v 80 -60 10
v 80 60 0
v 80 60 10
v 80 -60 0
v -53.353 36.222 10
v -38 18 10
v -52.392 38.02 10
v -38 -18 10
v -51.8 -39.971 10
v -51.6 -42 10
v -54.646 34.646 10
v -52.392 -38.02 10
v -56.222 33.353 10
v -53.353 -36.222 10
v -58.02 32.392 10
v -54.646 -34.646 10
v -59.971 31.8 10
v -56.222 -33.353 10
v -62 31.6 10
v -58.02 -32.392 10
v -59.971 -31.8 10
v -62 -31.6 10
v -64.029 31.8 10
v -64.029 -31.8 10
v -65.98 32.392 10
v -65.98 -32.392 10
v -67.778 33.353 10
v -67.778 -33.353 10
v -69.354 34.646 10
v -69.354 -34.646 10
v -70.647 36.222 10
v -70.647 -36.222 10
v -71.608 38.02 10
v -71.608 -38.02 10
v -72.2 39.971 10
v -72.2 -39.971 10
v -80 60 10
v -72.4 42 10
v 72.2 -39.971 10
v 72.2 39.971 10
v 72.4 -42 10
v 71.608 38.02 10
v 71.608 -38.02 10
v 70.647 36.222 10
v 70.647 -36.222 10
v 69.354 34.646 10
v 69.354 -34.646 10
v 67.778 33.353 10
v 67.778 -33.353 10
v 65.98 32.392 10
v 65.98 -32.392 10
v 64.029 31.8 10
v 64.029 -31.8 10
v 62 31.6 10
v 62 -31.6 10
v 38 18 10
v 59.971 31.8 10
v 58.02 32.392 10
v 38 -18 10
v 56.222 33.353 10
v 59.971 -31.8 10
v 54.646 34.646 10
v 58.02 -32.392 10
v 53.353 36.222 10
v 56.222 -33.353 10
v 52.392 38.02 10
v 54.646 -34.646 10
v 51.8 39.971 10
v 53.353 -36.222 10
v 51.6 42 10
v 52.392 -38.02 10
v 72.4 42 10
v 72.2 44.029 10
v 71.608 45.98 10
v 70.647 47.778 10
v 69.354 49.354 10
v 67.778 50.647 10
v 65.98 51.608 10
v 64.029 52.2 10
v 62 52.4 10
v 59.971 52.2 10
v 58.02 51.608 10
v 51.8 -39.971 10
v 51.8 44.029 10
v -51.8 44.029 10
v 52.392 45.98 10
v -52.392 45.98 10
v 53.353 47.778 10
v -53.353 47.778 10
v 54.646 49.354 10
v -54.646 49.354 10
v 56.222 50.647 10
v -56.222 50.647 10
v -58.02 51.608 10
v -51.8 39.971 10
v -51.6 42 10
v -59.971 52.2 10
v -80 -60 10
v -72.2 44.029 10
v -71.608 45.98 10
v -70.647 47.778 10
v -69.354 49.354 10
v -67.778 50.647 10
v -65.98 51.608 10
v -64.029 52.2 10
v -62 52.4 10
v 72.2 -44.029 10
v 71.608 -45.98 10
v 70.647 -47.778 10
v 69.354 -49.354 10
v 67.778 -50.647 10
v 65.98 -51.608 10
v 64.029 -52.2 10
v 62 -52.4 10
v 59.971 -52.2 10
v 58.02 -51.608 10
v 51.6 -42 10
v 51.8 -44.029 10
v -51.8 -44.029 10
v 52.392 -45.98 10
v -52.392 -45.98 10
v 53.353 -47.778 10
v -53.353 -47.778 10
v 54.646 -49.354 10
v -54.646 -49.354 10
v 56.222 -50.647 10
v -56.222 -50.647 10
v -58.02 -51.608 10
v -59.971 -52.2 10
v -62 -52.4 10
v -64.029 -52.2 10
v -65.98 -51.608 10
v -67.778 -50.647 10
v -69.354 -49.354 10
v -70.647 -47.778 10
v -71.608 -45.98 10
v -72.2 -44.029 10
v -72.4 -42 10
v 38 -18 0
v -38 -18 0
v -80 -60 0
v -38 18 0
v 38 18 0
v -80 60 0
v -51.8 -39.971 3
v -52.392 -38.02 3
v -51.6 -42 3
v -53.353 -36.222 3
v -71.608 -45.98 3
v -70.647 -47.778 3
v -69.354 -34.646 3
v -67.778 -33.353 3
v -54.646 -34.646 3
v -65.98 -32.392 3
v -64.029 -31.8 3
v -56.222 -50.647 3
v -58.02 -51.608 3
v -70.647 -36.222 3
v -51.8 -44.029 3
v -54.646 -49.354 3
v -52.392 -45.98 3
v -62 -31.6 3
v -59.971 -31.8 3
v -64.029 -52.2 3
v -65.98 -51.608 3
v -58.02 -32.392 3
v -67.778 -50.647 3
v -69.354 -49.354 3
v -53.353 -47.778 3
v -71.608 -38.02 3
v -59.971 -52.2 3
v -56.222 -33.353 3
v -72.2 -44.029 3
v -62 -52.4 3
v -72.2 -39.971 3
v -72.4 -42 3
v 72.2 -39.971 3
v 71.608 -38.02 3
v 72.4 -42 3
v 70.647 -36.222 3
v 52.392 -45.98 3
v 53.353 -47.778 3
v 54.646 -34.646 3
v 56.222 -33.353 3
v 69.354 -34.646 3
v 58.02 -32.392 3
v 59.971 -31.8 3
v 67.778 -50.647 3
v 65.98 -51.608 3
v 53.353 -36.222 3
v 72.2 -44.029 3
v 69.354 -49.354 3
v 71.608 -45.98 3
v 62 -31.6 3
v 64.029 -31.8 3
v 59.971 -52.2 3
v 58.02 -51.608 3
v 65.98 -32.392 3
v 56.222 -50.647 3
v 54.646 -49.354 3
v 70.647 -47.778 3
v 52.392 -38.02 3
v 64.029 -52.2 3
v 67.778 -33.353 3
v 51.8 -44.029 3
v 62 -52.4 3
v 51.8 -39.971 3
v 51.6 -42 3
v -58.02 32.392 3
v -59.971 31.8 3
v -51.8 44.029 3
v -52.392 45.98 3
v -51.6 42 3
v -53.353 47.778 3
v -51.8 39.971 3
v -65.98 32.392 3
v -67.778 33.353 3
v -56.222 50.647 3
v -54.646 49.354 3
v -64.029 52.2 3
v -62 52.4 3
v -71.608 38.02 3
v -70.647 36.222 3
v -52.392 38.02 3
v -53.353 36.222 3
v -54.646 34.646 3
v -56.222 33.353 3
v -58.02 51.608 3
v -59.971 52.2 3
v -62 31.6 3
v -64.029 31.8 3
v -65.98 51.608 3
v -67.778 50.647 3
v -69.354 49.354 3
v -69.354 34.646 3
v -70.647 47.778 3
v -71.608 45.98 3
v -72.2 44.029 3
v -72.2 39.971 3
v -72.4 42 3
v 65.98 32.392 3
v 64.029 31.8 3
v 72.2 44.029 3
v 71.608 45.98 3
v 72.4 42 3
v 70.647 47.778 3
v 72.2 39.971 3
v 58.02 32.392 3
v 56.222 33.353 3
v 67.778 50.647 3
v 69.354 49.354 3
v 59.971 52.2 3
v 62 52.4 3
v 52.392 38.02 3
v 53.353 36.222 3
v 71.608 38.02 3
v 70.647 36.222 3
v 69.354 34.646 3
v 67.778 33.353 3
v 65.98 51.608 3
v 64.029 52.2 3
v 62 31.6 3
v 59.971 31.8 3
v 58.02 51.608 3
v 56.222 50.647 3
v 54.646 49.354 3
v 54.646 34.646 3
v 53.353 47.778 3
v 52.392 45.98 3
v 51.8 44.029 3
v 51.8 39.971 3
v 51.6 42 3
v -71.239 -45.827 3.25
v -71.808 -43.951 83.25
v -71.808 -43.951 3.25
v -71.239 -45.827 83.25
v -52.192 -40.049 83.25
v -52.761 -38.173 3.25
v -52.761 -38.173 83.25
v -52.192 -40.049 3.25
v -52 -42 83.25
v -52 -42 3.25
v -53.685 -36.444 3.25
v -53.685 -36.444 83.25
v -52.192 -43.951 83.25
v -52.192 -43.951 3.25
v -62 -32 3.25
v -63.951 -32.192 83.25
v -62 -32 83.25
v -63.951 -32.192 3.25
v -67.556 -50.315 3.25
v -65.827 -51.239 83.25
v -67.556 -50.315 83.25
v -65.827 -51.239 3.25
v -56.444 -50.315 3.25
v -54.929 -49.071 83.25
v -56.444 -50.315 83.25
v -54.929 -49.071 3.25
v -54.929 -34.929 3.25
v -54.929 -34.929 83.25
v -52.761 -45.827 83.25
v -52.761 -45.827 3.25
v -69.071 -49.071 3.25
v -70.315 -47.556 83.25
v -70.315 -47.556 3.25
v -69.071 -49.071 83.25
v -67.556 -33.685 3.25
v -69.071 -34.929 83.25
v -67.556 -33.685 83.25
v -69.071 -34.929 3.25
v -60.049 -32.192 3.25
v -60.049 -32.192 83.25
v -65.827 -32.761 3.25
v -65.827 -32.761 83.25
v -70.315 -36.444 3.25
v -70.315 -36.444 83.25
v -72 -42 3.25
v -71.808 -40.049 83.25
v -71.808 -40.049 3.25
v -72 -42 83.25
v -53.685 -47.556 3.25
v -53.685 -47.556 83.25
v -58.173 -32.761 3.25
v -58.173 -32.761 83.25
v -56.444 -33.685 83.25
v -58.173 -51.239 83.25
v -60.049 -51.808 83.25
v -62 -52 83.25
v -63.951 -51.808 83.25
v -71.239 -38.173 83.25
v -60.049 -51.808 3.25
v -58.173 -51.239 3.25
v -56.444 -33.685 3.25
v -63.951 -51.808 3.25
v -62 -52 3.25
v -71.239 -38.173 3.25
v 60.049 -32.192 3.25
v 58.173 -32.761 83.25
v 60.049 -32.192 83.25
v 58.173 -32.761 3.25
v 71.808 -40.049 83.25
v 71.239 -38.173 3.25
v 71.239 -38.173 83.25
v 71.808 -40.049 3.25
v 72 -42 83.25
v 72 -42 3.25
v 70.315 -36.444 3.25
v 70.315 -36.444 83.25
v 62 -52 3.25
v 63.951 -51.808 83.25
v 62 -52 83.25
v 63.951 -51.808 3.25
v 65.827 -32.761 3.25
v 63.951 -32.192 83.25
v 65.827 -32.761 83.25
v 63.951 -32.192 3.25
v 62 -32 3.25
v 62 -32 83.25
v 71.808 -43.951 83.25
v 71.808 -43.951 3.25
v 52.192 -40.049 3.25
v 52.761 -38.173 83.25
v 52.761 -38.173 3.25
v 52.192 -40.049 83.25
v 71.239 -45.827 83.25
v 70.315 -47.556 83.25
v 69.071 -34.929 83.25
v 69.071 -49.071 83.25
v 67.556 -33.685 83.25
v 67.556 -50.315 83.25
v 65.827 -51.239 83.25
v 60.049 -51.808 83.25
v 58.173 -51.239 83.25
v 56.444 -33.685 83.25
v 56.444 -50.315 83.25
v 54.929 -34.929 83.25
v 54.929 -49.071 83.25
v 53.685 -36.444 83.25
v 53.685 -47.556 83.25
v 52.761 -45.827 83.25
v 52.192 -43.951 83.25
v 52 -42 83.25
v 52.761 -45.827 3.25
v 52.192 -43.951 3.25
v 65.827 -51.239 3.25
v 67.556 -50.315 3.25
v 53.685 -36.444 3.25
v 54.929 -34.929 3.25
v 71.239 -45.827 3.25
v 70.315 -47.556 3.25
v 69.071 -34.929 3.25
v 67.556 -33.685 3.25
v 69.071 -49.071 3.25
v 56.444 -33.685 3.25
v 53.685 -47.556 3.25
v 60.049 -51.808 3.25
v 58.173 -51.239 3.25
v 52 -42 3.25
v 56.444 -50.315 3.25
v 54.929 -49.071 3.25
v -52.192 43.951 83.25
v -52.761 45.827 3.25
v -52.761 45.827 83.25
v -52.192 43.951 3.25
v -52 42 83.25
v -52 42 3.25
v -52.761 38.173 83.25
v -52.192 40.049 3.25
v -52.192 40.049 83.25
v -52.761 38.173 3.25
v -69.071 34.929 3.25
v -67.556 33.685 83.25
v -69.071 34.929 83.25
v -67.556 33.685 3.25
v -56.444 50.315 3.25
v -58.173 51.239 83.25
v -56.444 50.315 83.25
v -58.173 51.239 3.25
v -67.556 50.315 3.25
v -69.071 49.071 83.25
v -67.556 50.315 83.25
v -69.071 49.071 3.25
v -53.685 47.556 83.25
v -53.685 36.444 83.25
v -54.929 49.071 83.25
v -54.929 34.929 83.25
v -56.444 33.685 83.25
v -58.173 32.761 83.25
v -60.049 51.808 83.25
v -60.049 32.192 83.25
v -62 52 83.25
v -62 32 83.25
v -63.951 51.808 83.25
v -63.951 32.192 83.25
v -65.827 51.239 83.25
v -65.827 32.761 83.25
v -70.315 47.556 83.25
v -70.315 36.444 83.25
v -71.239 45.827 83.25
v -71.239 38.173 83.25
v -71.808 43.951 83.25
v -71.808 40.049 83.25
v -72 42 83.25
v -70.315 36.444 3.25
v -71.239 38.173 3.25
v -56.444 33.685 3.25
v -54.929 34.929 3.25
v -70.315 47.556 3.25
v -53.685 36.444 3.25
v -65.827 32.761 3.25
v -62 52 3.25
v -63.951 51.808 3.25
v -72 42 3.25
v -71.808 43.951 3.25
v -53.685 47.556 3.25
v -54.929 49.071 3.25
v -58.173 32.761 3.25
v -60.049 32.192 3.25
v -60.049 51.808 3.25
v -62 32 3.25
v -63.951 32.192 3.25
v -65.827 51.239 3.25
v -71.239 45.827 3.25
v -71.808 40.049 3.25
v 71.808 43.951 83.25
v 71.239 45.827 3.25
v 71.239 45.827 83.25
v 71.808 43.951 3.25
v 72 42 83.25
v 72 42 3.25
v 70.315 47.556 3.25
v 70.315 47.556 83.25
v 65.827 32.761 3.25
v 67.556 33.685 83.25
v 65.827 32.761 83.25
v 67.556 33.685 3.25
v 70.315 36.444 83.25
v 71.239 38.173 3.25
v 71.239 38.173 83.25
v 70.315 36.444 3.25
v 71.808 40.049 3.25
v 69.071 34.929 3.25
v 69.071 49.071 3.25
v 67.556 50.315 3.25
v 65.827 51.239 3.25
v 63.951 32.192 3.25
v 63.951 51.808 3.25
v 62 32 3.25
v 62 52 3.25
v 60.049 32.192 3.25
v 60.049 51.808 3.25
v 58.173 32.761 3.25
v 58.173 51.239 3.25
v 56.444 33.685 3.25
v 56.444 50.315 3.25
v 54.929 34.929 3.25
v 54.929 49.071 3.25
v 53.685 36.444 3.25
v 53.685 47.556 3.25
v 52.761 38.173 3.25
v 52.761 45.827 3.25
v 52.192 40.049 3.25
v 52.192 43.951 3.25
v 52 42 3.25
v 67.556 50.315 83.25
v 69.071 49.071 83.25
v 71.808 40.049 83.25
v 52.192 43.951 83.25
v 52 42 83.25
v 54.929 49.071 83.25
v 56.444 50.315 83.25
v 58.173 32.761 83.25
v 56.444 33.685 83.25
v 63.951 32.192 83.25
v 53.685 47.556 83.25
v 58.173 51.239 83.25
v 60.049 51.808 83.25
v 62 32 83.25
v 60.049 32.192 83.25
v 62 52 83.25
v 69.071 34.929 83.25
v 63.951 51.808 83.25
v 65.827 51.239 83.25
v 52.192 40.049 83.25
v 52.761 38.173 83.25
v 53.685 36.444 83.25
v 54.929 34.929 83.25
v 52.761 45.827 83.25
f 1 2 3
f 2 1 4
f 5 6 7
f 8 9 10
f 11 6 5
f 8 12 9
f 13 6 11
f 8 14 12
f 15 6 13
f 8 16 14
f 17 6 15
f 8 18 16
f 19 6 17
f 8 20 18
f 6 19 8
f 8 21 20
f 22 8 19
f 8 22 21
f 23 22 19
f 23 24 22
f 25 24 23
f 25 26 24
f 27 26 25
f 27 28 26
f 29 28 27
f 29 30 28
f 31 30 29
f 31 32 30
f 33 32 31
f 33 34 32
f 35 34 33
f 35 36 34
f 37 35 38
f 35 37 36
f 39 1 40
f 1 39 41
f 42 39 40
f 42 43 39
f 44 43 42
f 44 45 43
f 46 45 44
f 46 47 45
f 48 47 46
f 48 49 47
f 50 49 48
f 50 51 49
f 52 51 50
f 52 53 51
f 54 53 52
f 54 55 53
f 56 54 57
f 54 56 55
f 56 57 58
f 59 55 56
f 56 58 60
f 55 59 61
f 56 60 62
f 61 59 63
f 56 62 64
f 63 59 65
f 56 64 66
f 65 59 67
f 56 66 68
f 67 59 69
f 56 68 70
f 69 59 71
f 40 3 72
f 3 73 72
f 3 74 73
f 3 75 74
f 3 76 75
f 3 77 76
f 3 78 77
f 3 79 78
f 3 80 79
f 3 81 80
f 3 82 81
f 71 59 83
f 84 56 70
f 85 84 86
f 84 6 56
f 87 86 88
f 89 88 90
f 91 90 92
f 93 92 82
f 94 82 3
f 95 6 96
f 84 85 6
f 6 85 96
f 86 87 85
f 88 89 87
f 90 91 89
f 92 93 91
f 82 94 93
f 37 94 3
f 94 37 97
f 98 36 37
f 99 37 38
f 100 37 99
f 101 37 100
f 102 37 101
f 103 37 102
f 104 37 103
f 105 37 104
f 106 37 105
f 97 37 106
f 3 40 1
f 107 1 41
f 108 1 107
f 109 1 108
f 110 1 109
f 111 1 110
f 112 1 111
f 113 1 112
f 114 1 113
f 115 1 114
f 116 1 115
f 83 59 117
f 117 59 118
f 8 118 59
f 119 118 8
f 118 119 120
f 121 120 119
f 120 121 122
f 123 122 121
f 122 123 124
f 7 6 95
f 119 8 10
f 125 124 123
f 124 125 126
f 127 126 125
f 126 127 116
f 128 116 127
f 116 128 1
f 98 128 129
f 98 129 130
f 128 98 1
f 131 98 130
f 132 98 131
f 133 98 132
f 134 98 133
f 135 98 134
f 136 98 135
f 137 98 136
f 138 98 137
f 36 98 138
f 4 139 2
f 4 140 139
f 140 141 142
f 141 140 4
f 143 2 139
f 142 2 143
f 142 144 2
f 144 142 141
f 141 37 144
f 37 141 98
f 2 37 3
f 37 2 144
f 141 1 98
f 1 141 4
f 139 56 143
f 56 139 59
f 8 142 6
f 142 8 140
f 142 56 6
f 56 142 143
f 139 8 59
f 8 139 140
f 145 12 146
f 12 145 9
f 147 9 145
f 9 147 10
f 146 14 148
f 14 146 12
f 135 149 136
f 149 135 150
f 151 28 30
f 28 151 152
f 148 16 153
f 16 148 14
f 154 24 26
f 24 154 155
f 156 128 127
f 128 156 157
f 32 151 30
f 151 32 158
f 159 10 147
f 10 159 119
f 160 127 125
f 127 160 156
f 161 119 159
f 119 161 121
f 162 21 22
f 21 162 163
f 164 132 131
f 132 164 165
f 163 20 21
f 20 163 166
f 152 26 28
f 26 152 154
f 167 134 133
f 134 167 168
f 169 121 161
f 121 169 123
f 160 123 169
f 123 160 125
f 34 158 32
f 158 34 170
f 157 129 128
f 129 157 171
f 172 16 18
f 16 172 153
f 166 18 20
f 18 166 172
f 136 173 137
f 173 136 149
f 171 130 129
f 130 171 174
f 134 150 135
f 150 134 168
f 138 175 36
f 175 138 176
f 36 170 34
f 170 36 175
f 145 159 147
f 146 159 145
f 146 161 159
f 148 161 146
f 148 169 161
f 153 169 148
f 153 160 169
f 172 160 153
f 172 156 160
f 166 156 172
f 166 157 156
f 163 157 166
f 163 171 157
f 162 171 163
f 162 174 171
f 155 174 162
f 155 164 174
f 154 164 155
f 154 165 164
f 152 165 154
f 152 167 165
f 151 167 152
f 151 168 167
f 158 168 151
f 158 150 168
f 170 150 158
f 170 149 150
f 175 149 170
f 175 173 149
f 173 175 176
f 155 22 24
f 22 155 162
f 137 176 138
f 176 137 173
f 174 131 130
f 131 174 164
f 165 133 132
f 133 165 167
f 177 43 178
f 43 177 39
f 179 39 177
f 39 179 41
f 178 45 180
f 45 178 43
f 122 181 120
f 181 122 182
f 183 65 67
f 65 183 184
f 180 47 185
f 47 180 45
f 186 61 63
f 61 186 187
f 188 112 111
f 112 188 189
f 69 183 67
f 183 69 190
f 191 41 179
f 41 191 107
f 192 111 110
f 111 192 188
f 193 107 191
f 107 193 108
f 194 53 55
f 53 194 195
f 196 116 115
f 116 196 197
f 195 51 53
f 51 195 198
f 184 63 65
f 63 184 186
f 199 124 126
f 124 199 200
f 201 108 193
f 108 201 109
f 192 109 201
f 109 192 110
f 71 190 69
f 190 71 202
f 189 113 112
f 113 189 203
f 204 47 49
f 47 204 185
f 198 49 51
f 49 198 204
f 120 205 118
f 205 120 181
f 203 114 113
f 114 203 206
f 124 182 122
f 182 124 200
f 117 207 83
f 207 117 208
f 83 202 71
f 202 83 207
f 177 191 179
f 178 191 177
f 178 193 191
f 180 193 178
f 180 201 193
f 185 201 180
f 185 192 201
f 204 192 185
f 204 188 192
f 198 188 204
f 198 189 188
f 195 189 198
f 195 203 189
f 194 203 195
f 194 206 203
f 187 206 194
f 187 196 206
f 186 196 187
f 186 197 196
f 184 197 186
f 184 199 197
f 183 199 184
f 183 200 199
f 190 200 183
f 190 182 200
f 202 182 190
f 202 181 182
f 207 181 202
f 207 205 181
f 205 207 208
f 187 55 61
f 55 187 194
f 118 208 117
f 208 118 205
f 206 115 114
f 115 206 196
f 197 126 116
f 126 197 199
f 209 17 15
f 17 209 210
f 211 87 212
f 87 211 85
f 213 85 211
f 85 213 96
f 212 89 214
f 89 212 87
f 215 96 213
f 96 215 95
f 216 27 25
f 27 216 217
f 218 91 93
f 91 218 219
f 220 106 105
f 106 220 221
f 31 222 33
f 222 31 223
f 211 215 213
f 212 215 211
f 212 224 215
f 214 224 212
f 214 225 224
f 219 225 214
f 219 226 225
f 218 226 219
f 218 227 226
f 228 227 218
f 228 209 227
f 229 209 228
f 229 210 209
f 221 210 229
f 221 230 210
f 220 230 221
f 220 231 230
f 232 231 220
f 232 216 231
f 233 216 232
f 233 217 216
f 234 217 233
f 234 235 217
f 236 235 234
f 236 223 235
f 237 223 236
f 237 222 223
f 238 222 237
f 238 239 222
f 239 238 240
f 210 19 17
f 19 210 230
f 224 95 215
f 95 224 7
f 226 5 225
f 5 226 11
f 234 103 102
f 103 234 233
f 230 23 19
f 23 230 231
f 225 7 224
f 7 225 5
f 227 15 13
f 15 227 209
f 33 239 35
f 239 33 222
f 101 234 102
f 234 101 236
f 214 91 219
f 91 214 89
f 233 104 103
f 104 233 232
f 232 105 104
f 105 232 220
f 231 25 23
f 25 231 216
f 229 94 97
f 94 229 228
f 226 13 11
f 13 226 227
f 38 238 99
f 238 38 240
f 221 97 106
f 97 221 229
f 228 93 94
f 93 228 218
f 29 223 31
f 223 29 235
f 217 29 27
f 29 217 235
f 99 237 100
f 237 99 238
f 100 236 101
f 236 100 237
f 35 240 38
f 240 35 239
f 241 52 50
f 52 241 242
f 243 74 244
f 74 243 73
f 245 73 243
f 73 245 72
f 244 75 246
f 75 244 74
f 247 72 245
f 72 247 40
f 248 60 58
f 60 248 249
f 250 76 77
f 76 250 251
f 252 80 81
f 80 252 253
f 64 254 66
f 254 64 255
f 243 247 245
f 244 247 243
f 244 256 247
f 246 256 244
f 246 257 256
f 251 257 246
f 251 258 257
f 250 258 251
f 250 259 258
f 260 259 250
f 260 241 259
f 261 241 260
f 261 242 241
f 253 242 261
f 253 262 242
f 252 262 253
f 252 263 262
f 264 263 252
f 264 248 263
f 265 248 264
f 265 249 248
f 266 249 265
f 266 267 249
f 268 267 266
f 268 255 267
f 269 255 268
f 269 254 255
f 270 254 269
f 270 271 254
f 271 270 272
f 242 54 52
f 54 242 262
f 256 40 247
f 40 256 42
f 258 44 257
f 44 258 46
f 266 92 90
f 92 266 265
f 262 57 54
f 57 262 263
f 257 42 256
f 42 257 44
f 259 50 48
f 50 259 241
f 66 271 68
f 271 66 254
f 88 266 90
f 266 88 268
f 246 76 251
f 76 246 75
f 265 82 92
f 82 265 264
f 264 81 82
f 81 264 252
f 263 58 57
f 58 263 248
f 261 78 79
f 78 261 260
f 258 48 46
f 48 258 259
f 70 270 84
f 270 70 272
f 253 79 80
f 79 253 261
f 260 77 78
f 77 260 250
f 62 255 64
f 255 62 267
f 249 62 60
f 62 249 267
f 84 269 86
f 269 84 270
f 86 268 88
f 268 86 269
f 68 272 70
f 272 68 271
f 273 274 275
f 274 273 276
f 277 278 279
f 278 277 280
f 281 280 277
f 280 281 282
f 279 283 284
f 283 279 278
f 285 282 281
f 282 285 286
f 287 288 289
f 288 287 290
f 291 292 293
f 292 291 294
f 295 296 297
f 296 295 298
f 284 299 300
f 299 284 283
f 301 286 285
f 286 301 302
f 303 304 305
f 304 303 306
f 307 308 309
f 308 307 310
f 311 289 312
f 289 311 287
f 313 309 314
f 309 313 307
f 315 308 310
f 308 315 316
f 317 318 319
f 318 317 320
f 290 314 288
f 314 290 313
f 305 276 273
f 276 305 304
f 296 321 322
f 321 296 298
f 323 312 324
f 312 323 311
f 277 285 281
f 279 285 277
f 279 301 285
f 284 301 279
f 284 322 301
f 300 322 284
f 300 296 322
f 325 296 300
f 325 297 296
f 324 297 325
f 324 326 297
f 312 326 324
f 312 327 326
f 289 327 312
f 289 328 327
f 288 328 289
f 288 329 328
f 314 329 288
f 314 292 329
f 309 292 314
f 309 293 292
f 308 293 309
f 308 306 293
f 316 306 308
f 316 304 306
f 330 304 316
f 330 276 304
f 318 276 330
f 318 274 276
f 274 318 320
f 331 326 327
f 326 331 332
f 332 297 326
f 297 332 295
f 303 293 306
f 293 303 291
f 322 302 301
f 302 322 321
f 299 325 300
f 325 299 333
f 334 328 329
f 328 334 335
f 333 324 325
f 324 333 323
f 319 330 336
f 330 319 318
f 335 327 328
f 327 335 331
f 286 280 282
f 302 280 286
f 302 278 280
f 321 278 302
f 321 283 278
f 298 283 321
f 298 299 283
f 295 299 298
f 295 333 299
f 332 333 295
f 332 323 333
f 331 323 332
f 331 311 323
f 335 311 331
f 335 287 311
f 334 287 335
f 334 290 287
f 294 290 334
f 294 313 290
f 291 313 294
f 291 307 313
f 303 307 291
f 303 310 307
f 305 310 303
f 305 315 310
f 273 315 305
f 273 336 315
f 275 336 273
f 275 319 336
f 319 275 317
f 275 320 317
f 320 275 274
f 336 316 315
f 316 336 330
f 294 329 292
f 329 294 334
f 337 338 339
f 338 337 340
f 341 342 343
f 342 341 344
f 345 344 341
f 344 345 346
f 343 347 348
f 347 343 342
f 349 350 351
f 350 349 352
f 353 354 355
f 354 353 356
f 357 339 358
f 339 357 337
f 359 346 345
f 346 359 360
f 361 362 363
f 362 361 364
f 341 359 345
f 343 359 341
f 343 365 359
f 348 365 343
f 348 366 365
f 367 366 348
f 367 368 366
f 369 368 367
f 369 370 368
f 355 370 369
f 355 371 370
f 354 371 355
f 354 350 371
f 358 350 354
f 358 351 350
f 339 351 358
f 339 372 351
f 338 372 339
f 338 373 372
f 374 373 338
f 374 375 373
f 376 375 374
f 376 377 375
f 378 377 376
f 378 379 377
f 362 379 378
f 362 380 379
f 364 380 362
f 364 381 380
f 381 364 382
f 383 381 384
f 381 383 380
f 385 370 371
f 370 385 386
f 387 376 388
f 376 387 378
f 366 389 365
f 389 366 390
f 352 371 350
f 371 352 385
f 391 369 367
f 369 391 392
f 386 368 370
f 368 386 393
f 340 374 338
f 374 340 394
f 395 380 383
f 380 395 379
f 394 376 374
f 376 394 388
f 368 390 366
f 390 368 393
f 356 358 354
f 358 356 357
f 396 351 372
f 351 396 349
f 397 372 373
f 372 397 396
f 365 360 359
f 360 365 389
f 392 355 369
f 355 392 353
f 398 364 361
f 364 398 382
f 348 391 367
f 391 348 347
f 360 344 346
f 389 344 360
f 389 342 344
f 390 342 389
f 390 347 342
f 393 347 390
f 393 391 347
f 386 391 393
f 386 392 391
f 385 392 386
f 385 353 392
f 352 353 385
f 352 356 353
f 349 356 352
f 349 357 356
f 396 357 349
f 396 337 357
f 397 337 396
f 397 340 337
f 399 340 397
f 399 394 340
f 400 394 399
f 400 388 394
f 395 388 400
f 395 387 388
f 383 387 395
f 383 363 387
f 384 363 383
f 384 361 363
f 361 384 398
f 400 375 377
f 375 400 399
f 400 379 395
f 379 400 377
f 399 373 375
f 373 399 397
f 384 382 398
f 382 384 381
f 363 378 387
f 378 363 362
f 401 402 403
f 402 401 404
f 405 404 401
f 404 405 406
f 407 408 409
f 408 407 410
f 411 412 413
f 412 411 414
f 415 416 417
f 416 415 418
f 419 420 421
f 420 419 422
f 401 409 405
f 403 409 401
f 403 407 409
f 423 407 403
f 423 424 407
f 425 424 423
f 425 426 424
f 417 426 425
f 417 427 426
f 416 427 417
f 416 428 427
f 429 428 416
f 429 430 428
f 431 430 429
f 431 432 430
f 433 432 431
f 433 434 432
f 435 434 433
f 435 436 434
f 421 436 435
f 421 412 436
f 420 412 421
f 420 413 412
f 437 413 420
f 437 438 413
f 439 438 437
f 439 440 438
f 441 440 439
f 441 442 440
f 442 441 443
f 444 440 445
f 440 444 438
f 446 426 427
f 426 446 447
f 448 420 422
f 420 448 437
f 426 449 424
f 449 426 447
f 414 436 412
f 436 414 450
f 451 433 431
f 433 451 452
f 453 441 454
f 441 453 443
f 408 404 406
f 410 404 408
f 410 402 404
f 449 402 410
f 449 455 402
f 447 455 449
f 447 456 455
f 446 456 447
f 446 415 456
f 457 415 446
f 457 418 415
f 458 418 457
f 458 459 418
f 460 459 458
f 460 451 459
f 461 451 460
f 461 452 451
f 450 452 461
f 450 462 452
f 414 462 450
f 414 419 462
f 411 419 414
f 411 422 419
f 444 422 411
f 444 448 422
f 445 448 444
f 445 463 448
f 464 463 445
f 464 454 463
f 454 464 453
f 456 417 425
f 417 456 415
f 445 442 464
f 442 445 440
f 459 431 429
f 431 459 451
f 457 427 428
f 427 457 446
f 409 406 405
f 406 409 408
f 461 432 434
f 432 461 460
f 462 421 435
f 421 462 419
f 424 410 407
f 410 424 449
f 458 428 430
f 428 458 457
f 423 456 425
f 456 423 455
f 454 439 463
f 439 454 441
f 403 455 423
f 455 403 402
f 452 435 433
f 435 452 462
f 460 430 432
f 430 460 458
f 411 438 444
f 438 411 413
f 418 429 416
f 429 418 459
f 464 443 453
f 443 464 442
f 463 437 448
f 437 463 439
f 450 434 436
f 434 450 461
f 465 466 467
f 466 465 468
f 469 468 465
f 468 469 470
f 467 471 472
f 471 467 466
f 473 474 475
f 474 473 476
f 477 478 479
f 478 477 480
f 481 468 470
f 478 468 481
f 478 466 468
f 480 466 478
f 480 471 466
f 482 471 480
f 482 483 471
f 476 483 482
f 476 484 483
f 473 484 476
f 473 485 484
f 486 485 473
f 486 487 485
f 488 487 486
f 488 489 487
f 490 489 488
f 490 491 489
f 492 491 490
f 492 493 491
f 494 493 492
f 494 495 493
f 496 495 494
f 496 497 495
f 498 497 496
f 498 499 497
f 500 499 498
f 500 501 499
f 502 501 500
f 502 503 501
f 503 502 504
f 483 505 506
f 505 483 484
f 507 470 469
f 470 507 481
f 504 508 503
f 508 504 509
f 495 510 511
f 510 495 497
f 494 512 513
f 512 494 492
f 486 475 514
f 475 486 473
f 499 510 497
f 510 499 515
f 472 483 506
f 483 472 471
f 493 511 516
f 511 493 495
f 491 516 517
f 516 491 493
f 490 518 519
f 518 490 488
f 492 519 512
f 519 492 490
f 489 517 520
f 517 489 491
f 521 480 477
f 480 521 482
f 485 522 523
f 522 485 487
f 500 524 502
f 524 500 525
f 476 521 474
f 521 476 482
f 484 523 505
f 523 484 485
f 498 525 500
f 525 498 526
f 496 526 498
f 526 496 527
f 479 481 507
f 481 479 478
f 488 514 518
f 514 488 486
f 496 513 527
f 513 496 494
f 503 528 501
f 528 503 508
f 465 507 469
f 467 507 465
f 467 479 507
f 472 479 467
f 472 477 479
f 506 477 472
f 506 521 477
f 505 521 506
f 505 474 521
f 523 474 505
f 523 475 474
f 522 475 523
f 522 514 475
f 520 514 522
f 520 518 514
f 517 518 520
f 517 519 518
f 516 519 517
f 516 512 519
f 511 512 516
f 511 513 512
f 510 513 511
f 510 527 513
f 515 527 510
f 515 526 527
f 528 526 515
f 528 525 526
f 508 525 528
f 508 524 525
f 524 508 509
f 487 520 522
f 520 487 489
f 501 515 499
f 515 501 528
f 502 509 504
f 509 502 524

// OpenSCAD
$fn = 32;

// ------------------------------------------------------------------------
// Frame with four posts: 160 x 120 mm frame, four d20 posts
// Every part is its own module, assembly() places them once.
// ------------------------------------------------------------------------

// --- part 1 ---
module base_frame() {
  difference() {
    translate([-80, -60, 0]) cube([160, 120, 10]);
    translate([-38, -18, -1]) cube([76, 36, 12]);
    translate([-62, -42, 3]) cylinder(h = 8, d = 20.8);
    translate([62, -42, 3]) cylinder(h = 8, d = 20.8);
    translate([-62, 42, 3]) cylinder(h = 8, d = 20.8);
    translate([62, 42, 3]) cylinder(h = 8, d = 20.8);
  }
}

// --- part 2 ---
module post1() {
  cylinder(h = 80, d = 20);
}

// --- part 3 ---
module post2() {
  cylinder(h = 80, d = 20);
}

// --- part 4 ---
module post3() {
  cylinder(h = 80, d = 20);
}

// --- part 5 ---
module post4() {
  cylinder(h = 80, d = 20);
}

// --- assembly ---
module assembly() {
  translate([0, 0, 0]) rotate([0, 0, 0]) base_frame();
  translate([-62, -42, 3.25]) rotate([0, 0, 0]) post1();
  translate([62, -42, 3.25]) rotate([0, 0, 0]) post2();
  translate([-62, 42, 3.25]) rotate([0, 0, 0]) post3();
  translate([62, 42, 3.25]) rotate([0, 0, 0]) post4();
}

assembly();
